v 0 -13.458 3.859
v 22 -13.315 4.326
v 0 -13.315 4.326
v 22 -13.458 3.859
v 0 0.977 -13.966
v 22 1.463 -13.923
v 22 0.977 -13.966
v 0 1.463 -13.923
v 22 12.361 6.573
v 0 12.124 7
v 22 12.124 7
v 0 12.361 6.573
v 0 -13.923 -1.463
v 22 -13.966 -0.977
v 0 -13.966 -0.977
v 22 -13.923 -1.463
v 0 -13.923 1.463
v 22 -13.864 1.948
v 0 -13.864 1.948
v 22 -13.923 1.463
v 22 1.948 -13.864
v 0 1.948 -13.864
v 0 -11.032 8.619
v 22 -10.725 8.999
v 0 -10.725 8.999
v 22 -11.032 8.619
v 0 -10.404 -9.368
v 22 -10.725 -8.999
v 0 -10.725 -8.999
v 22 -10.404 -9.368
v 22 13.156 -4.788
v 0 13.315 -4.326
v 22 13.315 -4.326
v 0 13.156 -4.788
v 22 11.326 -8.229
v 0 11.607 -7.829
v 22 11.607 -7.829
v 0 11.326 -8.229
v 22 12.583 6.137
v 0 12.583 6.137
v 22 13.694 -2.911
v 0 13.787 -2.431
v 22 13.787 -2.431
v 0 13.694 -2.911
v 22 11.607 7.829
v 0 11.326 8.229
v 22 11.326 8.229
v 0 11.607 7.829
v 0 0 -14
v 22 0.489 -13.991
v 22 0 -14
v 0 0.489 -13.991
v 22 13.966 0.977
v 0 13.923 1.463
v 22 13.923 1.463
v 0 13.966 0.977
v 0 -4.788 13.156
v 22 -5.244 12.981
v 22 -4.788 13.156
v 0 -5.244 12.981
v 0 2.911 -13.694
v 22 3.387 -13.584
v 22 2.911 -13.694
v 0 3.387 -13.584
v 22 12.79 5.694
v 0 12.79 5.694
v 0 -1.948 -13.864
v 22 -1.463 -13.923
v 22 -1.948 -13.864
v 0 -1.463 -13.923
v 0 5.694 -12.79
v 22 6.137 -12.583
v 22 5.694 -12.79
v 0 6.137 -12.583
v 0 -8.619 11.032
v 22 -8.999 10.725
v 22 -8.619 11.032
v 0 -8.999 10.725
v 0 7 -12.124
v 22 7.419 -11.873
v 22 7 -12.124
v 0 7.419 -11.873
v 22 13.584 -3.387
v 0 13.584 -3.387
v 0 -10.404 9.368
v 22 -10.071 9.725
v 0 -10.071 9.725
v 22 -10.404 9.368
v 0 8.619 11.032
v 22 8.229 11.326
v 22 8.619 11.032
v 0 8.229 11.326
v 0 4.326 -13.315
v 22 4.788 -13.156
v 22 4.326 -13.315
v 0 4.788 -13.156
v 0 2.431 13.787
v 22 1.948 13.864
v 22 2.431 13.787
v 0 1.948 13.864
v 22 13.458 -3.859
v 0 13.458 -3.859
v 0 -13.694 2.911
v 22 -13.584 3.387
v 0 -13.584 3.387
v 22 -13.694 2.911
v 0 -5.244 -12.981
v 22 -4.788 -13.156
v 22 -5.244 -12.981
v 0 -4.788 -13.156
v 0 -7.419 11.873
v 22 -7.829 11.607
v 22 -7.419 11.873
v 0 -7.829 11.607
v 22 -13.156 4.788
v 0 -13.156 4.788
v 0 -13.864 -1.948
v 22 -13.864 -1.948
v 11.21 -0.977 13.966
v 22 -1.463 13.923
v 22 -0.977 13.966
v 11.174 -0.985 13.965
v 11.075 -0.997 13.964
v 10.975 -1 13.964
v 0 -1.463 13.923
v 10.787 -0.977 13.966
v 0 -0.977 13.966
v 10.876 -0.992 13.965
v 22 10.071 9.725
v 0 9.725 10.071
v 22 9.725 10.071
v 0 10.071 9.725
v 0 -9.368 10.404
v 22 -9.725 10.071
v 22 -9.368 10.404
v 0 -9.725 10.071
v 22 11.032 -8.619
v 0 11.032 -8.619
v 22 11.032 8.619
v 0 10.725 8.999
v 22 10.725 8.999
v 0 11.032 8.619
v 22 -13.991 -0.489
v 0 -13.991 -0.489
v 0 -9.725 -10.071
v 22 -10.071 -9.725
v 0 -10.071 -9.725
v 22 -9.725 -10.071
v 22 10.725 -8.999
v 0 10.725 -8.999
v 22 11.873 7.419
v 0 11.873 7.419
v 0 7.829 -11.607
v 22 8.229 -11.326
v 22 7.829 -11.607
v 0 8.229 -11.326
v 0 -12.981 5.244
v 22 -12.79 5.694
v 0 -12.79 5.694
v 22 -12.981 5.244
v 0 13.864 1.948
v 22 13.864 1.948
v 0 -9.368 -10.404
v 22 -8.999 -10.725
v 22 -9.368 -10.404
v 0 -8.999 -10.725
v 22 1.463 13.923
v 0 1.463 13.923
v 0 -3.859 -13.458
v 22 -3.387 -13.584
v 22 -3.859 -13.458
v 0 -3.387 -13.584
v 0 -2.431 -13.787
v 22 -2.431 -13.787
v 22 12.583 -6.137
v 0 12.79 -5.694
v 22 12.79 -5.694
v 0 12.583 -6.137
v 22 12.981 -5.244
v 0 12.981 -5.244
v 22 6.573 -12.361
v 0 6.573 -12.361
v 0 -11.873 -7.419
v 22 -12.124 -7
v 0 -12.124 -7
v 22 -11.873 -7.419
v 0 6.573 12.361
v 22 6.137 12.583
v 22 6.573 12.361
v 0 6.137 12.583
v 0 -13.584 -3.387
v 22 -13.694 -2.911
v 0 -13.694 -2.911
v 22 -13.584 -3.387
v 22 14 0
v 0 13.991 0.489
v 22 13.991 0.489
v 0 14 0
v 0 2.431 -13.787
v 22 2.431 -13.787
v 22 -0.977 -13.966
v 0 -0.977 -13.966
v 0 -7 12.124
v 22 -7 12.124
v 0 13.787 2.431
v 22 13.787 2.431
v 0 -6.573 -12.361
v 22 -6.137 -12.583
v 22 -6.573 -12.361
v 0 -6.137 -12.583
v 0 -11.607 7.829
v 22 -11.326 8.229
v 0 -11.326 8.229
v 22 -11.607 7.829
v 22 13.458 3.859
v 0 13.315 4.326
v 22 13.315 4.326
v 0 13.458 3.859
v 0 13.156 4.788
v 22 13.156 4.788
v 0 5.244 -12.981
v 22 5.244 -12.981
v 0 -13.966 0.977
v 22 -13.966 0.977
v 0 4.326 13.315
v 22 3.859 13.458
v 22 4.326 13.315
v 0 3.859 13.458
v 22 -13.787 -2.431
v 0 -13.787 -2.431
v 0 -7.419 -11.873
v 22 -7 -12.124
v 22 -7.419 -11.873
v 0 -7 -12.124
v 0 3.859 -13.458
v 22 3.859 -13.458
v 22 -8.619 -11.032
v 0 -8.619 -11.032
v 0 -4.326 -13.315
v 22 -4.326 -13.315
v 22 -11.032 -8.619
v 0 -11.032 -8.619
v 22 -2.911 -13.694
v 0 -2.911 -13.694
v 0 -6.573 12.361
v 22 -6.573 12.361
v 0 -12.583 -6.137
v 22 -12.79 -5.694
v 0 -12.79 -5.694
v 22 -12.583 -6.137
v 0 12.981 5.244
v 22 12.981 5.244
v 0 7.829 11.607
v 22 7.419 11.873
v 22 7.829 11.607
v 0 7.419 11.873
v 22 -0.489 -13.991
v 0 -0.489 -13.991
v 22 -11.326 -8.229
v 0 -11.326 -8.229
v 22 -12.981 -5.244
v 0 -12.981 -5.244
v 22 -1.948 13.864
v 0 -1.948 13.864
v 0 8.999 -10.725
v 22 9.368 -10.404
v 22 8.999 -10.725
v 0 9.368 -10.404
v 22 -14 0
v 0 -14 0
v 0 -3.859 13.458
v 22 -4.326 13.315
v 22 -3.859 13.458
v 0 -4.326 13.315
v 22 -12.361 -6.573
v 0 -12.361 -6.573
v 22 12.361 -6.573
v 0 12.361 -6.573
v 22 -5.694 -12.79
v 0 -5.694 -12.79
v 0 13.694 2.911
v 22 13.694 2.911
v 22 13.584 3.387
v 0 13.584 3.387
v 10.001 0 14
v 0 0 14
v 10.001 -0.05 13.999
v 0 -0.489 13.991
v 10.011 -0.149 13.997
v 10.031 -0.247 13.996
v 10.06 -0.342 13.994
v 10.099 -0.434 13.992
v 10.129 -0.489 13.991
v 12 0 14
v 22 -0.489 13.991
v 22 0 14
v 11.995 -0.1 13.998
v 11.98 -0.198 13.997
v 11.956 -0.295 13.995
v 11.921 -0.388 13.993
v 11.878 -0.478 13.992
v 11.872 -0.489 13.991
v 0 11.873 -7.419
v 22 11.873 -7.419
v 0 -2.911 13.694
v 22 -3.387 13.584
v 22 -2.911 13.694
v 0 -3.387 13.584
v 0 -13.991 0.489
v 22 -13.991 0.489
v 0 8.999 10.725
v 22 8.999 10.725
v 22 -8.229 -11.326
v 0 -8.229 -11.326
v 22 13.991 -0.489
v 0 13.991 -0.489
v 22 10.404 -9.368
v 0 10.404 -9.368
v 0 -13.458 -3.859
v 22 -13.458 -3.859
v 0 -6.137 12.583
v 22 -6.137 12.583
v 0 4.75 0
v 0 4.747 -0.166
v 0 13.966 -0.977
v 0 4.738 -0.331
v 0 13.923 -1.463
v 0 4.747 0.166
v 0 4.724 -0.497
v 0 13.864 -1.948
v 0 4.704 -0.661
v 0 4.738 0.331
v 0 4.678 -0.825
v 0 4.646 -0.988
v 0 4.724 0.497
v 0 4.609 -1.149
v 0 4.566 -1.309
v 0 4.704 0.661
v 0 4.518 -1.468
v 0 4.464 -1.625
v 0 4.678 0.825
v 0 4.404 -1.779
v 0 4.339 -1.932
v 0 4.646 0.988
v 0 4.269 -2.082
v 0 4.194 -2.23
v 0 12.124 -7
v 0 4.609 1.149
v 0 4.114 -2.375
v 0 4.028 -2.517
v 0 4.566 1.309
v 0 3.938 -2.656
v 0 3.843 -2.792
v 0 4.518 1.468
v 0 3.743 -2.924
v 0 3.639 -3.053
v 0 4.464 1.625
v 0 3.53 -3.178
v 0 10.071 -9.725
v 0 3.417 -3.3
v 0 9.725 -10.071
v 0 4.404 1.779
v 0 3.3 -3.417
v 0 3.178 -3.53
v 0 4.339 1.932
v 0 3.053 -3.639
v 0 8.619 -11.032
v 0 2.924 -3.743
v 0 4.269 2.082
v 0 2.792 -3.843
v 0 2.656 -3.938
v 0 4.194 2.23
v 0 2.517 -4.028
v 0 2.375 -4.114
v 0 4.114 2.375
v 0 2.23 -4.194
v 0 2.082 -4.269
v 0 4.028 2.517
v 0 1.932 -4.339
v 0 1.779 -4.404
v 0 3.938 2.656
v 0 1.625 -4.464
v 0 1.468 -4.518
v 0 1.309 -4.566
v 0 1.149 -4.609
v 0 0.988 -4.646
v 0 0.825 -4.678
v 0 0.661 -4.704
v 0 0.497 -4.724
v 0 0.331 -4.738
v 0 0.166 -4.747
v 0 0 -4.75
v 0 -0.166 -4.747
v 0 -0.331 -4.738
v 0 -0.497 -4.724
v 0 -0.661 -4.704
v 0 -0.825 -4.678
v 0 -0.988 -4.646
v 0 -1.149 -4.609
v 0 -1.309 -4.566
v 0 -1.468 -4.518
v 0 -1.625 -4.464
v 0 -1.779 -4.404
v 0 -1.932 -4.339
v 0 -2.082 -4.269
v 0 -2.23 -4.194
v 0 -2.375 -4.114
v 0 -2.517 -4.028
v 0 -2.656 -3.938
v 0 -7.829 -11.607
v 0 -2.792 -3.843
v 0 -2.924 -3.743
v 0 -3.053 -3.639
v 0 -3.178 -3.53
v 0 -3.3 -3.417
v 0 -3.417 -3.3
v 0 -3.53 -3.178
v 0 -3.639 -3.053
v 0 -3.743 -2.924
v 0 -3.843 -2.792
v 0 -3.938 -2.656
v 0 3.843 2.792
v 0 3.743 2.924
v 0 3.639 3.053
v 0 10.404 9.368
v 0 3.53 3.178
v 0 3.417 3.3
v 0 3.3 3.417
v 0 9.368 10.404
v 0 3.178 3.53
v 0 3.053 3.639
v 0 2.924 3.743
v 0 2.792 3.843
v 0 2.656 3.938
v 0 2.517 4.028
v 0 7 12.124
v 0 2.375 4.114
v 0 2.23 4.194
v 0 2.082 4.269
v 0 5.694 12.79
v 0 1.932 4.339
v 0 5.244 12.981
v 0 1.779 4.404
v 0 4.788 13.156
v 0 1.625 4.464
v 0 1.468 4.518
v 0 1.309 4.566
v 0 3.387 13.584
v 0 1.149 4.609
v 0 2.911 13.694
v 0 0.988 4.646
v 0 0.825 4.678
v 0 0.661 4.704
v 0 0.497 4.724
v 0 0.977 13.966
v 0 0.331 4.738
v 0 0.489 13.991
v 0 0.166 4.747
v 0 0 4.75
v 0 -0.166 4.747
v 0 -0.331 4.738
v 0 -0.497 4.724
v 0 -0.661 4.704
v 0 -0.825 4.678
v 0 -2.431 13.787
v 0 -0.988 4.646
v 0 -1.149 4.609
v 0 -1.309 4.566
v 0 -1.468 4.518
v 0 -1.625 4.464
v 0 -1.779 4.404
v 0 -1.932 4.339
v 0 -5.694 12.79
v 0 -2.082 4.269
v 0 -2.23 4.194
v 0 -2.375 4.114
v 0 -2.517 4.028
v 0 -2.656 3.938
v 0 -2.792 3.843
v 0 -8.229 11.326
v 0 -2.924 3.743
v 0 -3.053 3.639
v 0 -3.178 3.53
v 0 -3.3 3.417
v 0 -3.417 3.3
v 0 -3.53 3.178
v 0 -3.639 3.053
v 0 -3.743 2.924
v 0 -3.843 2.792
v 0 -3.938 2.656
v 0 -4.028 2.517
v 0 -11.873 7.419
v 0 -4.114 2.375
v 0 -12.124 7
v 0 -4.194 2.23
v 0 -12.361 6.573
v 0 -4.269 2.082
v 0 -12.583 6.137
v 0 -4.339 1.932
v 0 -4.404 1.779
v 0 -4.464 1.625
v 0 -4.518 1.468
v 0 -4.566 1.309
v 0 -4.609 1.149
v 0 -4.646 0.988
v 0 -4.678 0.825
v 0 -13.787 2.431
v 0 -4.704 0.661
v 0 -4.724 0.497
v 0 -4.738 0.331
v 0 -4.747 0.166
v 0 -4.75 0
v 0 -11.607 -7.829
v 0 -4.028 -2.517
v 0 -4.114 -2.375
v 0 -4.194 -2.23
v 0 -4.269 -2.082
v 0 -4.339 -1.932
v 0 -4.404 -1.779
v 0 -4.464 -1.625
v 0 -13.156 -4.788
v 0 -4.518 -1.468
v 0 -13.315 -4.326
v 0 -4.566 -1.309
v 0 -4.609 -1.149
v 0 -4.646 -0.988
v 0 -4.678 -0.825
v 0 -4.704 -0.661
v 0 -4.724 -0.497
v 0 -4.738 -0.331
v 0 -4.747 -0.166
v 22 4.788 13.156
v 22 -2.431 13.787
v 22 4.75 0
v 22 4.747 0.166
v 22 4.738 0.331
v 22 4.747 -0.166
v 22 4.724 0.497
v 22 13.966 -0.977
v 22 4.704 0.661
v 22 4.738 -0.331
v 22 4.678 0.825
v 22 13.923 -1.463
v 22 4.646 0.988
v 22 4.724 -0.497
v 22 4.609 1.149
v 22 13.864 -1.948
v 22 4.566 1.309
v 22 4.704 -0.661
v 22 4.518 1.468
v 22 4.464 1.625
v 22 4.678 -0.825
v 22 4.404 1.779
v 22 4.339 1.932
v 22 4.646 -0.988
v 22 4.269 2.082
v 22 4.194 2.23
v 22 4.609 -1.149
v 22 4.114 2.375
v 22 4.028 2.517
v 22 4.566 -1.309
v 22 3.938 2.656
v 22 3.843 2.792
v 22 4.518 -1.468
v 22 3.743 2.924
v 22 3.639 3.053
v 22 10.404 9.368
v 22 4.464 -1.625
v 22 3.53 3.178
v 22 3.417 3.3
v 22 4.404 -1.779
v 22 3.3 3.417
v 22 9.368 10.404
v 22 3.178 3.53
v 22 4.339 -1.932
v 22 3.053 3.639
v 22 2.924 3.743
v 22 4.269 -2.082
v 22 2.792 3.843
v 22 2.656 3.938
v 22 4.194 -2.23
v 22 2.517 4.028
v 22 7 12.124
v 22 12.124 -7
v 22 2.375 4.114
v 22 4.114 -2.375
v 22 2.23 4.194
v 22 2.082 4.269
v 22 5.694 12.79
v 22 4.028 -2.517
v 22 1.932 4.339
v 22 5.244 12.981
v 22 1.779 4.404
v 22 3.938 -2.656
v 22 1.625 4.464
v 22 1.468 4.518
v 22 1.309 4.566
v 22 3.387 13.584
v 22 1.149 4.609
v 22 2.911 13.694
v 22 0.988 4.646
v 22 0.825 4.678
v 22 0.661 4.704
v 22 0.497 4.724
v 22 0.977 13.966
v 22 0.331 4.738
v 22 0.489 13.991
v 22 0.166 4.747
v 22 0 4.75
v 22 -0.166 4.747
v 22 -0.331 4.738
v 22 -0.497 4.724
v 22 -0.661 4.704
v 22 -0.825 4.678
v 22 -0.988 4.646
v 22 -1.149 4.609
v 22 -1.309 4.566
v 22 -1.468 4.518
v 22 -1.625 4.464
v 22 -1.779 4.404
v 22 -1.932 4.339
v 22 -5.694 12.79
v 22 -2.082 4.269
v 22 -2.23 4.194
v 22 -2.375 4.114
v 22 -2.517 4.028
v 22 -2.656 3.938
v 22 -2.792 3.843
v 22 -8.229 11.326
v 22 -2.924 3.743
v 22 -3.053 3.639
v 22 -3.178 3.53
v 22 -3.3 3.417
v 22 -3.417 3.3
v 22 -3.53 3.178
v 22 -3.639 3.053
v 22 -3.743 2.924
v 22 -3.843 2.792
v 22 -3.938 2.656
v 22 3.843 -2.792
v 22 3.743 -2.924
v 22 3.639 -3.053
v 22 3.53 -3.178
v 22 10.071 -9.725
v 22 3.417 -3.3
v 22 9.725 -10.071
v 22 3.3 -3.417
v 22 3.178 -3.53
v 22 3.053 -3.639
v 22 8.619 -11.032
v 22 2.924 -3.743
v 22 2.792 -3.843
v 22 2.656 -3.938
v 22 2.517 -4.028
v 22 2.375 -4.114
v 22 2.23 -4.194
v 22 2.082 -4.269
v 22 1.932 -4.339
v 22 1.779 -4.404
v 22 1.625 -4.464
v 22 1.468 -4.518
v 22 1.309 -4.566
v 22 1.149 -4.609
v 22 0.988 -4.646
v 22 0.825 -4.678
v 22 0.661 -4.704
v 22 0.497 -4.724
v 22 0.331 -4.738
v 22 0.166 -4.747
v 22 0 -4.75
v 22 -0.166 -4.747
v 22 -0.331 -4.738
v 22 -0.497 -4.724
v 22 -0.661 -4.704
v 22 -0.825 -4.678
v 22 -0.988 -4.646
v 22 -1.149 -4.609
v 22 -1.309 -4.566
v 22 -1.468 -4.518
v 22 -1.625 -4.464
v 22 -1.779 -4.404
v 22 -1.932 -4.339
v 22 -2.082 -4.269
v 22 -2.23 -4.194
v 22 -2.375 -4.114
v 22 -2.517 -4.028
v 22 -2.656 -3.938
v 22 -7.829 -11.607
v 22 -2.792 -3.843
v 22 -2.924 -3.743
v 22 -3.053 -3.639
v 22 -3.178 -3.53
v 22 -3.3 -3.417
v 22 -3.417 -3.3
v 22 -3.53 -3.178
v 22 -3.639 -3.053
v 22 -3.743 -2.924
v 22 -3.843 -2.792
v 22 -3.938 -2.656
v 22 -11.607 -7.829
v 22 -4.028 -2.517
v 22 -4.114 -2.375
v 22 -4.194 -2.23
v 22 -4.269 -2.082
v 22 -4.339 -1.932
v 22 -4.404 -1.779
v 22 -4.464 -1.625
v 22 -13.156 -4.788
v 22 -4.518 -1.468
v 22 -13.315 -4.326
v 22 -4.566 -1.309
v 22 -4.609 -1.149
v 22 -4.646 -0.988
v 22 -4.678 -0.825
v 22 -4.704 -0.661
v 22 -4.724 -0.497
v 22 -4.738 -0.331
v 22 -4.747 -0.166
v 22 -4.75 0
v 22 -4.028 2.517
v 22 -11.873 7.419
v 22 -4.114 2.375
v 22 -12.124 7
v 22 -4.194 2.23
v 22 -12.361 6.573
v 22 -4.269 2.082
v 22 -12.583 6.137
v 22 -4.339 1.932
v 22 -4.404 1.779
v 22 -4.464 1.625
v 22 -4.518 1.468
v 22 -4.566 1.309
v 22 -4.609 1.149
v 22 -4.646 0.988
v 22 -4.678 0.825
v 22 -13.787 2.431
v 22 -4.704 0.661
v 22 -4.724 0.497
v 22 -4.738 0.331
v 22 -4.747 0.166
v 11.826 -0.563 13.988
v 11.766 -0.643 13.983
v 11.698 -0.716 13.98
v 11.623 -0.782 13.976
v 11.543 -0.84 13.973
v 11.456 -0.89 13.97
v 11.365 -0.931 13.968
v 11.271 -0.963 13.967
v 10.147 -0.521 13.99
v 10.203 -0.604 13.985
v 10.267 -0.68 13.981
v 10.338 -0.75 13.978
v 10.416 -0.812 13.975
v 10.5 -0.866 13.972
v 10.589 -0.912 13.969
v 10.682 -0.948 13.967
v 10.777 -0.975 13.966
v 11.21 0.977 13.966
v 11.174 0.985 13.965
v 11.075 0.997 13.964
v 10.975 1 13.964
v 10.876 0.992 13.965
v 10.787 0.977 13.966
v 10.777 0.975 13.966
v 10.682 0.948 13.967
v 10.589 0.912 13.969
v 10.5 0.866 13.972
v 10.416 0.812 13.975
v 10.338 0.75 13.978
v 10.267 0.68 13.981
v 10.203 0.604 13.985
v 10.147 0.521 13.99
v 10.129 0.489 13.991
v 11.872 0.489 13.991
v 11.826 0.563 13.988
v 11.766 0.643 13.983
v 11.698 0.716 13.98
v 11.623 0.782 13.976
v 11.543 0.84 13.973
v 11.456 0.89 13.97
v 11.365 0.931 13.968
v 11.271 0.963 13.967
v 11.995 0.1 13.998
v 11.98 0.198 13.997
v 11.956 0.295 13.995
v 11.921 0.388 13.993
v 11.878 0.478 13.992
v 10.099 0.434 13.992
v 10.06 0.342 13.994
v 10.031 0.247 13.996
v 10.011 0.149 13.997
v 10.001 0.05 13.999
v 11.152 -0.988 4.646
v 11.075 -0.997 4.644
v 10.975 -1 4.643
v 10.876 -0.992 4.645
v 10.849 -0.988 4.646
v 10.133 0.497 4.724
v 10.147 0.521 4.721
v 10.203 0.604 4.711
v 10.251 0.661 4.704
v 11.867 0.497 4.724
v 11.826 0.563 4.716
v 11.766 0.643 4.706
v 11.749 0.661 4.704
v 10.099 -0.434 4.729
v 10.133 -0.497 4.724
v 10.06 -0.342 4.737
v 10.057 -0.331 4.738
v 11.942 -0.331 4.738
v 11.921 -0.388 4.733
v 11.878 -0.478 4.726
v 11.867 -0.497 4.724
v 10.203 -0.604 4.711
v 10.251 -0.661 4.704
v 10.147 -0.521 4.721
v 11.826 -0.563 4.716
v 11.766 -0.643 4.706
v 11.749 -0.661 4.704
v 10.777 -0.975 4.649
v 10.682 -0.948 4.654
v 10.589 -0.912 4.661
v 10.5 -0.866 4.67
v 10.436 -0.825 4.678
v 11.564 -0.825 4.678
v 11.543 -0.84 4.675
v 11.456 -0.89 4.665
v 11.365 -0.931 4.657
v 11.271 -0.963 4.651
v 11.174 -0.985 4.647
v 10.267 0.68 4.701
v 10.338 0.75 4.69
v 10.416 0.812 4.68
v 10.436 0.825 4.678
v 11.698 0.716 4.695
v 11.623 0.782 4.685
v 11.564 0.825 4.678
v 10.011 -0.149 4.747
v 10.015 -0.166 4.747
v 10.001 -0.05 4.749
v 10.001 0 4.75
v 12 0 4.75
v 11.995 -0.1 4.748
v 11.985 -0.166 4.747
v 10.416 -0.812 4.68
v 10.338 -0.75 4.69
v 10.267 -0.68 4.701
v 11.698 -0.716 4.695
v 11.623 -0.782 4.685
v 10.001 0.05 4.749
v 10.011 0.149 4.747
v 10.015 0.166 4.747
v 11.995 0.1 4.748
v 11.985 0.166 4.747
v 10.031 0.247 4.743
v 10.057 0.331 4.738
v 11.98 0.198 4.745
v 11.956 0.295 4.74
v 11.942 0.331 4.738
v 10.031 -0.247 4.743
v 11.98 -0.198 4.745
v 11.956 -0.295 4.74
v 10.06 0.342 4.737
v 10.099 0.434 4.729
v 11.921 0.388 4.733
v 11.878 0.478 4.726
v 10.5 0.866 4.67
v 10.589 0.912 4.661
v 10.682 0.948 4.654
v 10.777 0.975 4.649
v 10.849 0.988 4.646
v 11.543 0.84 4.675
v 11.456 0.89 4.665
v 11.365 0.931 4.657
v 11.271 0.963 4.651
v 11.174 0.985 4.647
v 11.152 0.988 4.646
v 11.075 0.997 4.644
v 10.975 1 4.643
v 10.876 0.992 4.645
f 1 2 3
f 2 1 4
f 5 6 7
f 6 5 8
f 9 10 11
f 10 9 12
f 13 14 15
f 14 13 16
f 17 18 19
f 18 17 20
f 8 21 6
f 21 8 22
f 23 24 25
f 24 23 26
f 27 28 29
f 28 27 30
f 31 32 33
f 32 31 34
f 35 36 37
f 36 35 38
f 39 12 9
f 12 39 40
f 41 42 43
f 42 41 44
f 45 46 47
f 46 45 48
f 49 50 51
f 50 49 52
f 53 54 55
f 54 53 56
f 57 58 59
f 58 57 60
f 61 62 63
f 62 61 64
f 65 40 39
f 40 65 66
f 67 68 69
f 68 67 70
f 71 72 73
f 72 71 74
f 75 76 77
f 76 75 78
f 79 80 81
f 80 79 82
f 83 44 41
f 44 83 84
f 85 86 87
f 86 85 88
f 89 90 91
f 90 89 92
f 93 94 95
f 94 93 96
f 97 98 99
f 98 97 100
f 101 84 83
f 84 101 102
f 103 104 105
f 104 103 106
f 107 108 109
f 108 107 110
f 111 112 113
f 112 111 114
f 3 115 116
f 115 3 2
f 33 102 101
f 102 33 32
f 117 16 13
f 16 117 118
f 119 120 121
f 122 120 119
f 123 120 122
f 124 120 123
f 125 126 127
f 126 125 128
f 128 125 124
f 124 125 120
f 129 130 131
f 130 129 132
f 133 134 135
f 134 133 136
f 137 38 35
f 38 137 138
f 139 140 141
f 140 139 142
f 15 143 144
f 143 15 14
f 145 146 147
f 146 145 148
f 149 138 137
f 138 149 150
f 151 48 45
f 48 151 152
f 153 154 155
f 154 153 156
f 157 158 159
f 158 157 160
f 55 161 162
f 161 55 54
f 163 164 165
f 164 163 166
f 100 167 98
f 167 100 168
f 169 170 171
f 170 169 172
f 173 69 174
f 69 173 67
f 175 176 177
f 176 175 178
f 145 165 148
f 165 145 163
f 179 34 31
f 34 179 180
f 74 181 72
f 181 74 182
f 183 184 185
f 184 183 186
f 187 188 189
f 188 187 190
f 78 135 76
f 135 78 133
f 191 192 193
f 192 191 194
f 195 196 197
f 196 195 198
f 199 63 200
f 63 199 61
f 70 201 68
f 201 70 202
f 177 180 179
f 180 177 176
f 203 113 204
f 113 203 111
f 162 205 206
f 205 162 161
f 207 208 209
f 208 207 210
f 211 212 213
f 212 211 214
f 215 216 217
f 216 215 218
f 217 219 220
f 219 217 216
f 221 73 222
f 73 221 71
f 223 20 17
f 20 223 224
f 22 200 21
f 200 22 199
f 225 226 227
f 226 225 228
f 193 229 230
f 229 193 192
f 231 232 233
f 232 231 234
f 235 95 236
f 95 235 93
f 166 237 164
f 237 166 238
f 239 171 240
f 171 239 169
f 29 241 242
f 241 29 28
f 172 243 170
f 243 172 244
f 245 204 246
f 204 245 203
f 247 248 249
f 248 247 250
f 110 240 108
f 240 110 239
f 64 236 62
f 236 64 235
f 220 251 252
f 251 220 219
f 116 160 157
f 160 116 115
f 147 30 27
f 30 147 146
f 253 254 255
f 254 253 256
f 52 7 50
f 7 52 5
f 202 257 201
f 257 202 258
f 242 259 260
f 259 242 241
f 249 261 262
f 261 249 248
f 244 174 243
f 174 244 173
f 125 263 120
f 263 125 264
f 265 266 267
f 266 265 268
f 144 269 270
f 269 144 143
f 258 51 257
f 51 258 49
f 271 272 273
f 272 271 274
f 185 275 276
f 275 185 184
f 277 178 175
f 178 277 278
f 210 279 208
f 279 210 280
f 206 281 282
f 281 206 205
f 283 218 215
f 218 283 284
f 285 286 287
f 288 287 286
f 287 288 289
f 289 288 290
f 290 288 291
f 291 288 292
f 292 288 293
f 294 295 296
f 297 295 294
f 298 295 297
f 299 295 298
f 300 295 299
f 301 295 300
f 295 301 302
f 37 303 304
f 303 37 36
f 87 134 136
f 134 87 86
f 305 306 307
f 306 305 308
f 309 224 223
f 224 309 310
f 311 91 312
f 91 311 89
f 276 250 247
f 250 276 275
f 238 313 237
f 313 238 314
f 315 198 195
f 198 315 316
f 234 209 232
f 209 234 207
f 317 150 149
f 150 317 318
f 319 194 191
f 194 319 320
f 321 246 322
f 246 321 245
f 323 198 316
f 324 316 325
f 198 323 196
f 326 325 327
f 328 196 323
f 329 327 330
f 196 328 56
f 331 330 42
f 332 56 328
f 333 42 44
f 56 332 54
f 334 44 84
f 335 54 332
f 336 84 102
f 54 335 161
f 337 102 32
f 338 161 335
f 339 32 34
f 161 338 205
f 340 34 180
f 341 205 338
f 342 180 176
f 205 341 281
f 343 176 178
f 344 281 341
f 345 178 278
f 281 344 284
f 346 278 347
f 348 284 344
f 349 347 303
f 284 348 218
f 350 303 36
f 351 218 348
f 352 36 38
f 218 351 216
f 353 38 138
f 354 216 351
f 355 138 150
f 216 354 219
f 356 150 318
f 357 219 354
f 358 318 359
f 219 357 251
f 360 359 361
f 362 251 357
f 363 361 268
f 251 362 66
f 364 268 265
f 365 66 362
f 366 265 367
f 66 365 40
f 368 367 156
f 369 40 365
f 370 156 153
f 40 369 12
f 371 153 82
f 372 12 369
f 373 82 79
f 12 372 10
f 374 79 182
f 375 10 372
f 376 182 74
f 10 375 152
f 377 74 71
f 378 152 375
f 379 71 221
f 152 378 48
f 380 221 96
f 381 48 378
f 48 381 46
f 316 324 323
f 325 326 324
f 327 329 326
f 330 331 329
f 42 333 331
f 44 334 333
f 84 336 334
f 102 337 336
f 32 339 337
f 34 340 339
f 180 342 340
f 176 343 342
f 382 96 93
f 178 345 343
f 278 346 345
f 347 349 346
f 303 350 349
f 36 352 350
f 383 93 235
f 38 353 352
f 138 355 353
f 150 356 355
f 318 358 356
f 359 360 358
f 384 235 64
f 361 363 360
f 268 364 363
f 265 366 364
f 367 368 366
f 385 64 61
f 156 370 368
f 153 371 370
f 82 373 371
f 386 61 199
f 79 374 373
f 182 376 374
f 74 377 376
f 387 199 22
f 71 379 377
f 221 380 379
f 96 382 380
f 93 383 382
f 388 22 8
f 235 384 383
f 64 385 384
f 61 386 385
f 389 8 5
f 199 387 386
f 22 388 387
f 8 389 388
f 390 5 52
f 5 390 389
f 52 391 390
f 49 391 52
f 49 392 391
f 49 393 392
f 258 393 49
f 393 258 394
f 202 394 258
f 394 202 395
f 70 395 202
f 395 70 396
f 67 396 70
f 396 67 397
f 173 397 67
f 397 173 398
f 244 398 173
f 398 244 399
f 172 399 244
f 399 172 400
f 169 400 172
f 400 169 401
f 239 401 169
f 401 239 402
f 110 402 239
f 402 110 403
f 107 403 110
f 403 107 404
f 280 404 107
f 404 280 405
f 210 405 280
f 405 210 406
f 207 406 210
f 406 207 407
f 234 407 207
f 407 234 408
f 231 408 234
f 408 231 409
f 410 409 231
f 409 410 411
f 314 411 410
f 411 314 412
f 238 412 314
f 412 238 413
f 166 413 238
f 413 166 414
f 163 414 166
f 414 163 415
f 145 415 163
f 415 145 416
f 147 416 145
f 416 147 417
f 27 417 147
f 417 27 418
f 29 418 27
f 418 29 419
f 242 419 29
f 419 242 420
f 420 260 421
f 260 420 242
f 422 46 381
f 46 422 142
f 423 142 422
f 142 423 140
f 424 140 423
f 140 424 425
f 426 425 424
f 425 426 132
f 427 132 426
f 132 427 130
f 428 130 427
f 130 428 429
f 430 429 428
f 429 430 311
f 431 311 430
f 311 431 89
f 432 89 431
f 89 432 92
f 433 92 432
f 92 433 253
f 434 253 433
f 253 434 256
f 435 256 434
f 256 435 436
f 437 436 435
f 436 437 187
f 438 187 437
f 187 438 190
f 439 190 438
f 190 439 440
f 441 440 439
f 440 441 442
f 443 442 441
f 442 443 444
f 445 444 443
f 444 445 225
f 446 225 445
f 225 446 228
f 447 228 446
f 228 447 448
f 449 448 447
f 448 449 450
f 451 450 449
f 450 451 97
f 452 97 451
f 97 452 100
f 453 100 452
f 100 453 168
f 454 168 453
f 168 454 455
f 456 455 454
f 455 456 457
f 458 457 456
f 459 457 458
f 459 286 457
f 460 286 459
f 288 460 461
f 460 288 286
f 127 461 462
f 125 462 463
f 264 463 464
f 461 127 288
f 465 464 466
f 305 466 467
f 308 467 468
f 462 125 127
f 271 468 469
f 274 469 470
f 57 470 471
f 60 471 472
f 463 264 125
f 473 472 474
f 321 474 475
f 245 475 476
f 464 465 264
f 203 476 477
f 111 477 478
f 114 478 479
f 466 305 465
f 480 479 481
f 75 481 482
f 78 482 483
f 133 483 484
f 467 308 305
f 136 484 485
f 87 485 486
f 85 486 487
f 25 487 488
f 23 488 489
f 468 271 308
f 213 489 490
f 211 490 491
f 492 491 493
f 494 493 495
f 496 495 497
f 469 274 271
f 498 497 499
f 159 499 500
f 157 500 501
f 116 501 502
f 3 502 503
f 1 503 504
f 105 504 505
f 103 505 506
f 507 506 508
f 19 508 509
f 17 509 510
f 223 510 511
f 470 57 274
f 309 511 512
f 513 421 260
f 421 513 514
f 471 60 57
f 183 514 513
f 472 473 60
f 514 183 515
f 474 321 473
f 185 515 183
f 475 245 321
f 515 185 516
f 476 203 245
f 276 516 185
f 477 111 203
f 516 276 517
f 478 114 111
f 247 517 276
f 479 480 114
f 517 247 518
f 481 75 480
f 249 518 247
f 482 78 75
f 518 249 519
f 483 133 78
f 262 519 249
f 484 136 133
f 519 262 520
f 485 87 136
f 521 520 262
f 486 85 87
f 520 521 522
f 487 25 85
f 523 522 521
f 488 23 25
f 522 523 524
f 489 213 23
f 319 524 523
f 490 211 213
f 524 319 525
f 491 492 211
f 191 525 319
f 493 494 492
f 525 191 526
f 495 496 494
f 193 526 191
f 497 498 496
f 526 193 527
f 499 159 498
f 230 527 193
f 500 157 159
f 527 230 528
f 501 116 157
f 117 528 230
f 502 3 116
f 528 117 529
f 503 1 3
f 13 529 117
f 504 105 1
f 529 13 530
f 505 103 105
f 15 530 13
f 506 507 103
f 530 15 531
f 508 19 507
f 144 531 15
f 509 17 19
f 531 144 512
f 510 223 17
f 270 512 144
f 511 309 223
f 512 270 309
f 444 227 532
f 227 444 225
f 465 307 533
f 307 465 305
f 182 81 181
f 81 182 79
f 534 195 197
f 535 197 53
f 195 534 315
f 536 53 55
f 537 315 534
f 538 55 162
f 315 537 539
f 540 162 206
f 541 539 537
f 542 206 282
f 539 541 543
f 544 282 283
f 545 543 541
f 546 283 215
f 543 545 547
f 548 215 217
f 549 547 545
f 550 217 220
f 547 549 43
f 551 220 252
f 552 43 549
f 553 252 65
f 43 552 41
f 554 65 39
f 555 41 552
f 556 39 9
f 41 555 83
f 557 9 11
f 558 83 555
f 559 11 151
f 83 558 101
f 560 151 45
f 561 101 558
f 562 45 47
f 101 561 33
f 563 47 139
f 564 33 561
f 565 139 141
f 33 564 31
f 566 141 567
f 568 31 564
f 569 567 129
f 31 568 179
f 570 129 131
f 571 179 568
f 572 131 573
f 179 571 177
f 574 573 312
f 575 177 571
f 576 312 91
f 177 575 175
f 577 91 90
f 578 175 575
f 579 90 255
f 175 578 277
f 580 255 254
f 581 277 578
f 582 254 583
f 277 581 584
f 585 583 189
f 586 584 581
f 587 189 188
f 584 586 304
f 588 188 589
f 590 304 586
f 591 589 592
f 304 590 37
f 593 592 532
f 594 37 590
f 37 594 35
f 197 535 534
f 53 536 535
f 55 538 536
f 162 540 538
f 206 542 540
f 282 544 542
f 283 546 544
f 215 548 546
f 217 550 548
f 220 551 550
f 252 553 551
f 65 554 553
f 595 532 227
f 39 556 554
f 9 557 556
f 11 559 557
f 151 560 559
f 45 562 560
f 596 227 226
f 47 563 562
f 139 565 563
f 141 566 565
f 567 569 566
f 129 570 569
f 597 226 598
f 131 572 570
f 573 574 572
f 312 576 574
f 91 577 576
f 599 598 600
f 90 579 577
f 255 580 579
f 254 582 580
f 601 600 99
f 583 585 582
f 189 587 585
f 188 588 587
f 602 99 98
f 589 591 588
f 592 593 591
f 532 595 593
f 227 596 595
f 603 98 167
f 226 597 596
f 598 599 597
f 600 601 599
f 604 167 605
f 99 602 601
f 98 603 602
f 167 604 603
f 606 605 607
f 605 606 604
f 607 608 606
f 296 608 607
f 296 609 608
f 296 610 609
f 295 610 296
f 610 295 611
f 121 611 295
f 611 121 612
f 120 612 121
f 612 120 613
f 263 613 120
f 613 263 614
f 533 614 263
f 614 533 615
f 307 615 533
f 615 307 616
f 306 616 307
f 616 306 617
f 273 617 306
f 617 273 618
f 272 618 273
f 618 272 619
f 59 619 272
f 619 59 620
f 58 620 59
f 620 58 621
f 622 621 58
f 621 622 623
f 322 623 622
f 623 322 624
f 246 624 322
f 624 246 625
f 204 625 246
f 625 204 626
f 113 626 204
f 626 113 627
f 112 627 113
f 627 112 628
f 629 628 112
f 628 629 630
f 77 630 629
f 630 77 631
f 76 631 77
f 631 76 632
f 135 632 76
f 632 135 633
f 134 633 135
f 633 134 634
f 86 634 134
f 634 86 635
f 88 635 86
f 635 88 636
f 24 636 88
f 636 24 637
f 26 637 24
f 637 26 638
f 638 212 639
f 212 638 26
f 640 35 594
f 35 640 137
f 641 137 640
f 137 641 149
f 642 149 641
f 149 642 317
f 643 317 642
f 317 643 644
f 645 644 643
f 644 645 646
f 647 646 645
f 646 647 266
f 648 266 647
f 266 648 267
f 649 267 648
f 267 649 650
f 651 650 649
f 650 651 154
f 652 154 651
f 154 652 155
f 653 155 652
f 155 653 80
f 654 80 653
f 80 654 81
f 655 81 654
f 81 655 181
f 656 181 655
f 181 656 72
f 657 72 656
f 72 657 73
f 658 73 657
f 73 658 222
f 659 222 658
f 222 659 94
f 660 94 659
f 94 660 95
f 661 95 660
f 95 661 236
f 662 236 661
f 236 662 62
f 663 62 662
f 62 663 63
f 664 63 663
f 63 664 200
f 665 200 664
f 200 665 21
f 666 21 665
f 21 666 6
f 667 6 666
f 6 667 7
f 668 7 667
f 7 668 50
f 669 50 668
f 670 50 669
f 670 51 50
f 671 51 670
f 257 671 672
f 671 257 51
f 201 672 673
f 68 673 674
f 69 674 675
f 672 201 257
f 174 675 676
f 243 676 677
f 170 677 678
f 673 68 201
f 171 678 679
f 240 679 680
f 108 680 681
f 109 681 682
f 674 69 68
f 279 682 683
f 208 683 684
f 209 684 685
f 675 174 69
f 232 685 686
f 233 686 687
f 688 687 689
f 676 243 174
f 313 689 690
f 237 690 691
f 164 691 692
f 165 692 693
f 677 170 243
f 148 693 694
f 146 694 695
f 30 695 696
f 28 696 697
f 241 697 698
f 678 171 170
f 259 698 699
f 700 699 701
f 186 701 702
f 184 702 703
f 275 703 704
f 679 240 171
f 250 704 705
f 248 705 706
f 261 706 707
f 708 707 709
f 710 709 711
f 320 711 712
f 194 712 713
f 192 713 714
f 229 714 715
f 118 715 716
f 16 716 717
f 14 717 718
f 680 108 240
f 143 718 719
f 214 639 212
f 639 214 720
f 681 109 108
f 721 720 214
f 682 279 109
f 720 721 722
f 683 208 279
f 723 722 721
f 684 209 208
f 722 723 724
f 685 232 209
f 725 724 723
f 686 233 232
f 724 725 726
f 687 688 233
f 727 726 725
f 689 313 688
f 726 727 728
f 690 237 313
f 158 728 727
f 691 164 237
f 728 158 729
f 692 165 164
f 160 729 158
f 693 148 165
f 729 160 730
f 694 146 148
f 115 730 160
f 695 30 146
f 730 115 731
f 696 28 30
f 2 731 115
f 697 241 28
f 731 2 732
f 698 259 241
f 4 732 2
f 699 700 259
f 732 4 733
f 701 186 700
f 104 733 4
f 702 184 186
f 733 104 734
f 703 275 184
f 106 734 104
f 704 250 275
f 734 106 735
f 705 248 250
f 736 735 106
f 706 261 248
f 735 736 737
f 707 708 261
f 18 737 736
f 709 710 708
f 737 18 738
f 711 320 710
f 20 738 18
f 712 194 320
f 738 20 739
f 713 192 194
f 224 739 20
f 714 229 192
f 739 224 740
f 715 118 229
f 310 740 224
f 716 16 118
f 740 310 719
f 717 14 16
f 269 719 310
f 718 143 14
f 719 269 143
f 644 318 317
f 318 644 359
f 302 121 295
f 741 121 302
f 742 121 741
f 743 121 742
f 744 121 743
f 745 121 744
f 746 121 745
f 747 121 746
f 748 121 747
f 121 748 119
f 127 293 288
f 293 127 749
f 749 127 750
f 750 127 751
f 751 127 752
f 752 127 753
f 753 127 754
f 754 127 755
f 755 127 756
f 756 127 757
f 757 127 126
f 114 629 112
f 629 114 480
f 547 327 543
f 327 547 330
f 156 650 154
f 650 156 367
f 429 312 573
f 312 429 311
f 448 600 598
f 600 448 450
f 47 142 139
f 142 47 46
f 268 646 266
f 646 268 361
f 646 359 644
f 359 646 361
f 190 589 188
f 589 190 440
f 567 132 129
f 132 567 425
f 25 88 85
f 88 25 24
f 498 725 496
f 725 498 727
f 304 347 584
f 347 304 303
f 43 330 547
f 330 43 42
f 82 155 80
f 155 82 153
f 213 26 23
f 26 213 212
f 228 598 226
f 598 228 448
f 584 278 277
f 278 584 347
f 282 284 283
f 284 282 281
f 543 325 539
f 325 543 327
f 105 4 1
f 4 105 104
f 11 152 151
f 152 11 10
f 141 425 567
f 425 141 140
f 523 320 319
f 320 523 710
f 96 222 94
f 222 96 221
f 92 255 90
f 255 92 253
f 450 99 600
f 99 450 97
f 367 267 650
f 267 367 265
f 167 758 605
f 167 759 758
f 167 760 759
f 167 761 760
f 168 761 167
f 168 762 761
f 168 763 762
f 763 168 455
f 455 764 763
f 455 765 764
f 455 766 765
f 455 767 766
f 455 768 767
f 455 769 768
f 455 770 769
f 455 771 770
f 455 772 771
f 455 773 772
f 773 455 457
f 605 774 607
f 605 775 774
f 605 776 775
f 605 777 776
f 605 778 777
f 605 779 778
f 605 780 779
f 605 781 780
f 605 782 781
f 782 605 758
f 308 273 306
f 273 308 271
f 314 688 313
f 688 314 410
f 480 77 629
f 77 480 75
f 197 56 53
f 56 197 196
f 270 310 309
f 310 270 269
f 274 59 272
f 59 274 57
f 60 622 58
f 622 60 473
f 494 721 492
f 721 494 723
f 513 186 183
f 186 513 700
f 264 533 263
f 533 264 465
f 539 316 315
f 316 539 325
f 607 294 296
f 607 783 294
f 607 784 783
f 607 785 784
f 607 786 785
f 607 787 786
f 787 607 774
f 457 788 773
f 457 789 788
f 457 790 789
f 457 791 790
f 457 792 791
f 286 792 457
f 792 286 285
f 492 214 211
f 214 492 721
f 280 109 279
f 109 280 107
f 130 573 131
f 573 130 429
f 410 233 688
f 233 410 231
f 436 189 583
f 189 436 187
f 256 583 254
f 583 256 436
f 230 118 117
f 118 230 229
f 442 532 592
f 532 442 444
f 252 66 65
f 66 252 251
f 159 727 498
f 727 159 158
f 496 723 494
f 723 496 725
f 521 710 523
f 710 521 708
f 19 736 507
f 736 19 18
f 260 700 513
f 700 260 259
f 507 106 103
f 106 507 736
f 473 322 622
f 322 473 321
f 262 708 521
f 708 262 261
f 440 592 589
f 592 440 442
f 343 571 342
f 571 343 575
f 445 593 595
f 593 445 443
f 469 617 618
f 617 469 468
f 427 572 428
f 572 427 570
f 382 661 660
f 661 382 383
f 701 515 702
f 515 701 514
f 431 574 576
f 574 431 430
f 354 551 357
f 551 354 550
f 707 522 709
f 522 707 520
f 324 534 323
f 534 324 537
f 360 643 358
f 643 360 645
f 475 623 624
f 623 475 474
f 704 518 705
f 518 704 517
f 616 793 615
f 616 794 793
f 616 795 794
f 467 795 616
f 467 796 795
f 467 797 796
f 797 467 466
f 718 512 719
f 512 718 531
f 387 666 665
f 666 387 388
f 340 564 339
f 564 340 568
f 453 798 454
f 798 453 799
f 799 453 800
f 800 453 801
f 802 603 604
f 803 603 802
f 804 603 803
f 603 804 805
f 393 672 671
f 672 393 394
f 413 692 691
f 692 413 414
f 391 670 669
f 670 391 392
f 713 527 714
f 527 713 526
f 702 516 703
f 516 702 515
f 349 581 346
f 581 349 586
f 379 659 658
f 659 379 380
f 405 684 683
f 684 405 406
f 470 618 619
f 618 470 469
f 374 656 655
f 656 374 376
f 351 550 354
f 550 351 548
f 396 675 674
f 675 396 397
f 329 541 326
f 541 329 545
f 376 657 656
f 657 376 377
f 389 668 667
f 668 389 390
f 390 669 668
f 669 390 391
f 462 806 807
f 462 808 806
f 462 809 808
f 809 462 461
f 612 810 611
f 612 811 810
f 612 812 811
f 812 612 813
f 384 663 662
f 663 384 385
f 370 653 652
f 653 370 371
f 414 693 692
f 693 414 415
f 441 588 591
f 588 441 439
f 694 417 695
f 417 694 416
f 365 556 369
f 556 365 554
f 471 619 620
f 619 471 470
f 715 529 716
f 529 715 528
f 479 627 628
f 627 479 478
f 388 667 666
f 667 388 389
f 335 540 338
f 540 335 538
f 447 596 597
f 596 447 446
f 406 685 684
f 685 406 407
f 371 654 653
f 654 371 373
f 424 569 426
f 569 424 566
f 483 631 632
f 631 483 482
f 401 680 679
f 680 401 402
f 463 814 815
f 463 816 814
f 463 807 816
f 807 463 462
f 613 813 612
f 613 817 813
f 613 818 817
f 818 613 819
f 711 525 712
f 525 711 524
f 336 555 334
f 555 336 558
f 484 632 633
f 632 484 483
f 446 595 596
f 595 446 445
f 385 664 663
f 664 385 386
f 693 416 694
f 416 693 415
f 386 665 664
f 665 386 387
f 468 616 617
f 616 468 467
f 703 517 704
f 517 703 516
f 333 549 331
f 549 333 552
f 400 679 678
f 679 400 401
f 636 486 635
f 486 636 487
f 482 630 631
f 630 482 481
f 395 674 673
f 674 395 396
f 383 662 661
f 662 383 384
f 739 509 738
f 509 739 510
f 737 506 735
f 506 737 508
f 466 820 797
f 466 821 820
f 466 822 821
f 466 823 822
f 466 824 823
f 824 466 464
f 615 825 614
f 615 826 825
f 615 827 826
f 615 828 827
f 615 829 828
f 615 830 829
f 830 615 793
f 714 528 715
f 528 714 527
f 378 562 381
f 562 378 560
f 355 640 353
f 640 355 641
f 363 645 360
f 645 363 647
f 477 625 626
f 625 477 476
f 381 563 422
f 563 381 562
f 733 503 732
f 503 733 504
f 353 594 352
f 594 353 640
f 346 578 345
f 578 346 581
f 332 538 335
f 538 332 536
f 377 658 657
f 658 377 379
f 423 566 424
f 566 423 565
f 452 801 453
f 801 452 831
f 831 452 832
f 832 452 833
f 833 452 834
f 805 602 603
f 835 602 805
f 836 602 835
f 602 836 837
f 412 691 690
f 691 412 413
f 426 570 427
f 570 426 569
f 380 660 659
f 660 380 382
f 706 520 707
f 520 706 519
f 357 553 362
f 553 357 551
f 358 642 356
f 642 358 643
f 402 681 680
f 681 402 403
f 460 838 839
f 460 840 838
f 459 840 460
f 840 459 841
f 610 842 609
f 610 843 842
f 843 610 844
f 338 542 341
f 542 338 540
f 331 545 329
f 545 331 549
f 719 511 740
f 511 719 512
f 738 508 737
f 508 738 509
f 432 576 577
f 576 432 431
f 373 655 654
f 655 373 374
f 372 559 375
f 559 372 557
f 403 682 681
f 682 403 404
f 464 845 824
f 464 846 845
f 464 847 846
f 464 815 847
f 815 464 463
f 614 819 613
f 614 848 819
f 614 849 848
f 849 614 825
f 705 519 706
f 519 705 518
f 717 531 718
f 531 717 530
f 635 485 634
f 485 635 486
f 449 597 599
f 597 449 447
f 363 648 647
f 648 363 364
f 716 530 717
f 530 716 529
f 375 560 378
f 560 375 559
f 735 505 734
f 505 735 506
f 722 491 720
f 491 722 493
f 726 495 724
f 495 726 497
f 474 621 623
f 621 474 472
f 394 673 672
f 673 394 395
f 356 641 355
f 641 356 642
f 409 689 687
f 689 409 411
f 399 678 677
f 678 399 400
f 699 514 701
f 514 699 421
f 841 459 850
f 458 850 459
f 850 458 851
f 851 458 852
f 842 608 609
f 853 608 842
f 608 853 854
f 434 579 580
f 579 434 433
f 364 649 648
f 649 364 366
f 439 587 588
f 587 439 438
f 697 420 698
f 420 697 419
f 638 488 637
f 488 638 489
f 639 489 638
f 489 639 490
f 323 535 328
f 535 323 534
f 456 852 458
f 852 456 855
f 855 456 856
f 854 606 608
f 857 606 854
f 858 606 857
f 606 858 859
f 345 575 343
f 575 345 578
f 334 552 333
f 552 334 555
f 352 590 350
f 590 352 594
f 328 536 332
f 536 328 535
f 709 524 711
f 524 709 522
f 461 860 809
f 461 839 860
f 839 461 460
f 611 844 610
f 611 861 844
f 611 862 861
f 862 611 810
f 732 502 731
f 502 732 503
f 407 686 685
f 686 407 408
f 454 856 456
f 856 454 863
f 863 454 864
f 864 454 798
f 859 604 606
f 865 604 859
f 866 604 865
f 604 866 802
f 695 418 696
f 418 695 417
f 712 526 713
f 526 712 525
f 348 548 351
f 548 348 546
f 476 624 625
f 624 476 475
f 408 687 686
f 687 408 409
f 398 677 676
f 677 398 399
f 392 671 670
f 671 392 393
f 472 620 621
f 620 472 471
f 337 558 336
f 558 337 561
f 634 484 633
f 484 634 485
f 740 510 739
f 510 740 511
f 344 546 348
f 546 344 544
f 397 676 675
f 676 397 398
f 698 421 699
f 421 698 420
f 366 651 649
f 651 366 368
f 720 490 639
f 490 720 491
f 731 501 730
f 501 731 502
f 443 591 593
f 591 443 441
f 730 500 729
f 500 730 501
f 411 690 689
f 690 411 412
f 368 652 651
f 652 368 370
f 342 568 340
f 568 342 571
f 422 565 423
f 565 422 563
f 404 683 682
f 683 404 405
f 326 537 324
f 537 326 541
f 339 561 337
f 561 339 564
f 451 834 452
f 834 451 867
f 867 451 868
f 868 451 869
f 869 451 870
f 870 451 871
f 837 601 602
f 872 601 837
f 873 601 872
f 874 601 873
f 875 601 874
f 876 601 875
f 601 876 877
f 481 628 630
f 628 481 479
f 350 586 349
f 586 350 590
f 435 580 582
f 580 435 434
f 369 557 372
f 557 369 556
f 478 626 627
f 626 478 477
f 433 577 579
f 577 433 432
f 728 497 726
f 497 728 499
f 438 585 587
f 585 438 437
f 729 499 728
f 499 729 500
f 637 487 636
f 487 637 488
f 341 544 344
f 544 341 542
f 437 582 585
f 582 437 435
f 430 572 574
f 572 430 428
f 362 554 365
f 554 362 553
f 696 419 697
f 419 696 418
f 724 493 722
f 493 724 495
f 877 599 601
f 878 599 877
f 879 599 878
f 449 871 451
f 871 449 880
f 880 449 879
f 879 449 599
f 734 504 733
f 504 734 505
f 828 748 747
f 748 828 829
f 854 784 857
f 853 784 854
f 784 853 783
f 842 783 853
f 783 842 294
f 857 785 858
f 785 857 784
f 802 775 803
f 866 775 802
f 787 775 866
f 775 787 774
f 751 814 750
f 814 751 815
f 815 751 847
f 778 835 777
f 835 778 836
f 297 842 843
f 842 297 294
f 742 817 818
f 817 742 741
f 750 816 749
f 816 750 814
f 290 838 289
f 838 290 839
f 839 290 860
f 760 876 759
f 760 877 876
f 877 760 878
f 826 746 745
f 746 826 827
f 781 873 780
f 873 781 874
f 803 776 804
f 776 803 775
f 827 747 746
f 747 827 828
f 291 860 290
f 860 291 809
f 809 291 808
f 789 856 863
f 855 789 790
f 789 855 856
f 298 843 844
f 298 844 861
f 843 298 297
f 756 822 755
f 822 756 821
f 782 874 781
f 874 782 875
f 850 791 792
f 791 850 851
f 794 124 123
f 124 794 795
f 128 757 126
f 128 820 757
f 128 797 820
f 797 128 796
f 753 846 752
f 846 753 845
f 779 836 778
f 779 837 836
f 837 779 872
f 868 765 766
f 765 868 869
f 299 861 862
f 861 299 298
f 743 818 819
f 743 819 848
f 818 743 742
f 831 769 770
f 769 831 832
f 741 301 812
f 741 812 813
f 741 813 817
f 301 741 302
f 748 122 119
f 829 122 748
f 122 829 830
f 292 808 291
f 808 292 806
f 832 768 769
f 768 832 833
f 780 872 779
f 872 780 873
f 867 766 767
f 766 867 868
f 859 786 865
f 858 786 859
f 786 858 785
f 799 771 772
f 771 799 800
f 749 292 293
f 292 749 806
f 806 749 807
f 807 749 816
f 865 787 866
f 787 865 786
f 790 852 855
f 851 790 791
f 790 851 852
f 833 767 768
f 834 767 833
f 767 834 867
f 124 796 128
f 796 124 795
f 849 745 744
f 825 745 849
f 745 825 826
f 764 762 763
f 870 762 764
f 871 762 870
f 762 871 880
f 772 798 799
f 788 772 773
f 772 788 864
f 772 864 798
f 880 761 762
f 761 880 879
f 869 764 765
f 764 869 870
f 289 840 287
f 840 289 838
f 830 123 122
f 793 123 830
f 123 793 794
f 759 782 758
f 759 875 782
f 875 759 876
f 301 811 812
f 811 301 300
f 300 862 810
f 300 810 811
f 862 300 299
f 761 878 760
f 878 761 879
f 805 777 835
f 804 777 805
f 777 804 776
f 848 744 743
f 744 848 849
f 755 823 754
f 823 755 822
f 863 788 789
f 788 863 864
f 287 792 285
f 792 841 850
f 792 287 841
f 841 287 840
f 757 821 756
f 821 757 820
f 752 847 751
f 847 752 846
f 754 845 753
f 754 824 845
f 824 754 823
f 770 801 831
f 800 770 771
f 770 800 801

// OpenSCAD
// file: ../lib/common.scad
// Shared helpers for the AR turntable part models.
//
// Every part file holds a parameter table P. Each row is:
//   [id, description, value_mm, evidence, display_unit, source_or_how_to_check]
//
// Evidence codes:
//   F  factory document          O  owner report
//   C  community drawing         S  industry standard
//   D  design choice             M  measured for this repository
//   PH placeholder: chosen only so the model has a shape. It is NOT a
//      measurement. Replace it, and change the code, once it is measured.
// License: CC BY-SA 4.0. See LICENSE at the repository root.

IN = 25.4;      // one inch, in mm. All model geometry is in mm.
EPS = 0.01;     // overlap so boolean cuts do not leave zero-thickness skins
$fa = 2;
$fs = 0.1;

// Value of parameter `id` in table t.
function pv(t, id) = t[search([id], t)[0]][2];

// Print part data for cad/tools/build.py, which reads it from the console.
module emit(meta, params, dims = []) {
    echo(META = meta);
    for (row = params) echo(PARAM = row);
    for (row = dims) echo(DIM = row);
}

// Rounded rectangle prism: centered in XY, from z = 0 to z = h.
module rr_prism(l, w, h, r) {
    translate([-l / 2 + r, -w / 2, 0]) cube([l - 2 * r, w, h]);
    translate([-l / 2, -w / 2 + r, 0]) cube([l, w - 2 * r, h]);
    for (sx = [-1, 1], sy = [-1, 1])
        translate([sx * (l / 2 - r), sy * (w / 2 - r), 0]) cylinder(r = r, h = h);
}

// Slot along X: `c` is the distance between end-radius centers.
module slot_prism(c, w, h) {
    translate([-c / 2, -w / 2, 0]) cube([c, w, h]);
    for (sx = [-1, 1]) translate([sx * c / 2, 0, 0]) cylinder(d = w, h = h);
}
// main file
// AR XA tonearm counterweight.
// Size, bore, material, and mass come from one owner's report on one XA:
// parts/xa-counterweight.md. Parameter IDs match TO-CONFIRM.md.
// License: CC BY-SA 4.0. See LICENSE at the repository root.
include <../lib/common.scad>

variant = 1;
flat = false;

P = [
    ["CW3", "Outside diameter", 28, "O", "mm", "Owner report, parts/xa-counterweight.md"],
    ["CW4", "Length along bore", 22, "O", "mm", "Owner report, parts/xa-counterweight.md"],
    ["CW5", "Bore diameter", 9.5, "O", "mm", "Owner report; a nominal value, not a fit against the arm stub"],
    ["CW6", "Bore runs through and on center: assumed", 22, "PH", "mm", "Inspect the part. Measure wall thickness around the bore"],
    ["CW8", "Locking-hole size, tap drill until thread is known", 2.0, "PH", "mm", "Gauge the set screw thread, then set the tap drill"],
    ["CW9", "Locking-hole position from the end face", 11, "PH", "mm", "Calipers, from one end of the weight"],
];

od = pv(P, "CW3");
len = pv(P, "CW4");
bore = pv(P, "CW5");
lock_d = pv(P, "CW8");
lock_x = pv(P, "CW9");

// Axis along X so the top view shows the weight as it sits on the arm.
module part() {
    difference() {
        rotate([0, 90, 0]) cylinder(d = od, h = len);
        translate([-1, 0, 0]) rotate([0, 90, 0]) cylinder(d = bore, h = len + 2);
        translate([lock_x, 0, 0]) cylinder(d = lock_d, h = od);
    }
}

emit(
    [
        ["id", "xa-counterweight"],
        ["title", "XA tonearm counterweight"],
        ["status", "PRELIMINARY"],
        ["scope", "One owner's XA. XB and AR77XB counterweights differ"],
        ["material", "Brass, alloy not established (owner report)"],
        ["density", 8.5],
        ["make", "Turn, bore, cross-drill and tap. 1 off"],
        ["reference_mass_g", 98.8],
        ["views", ["front", "top", "right", "left", "iso"]],
        ["sections", [["A", "y", 0]]],
        ["notes", [
            "Reported mass 98.8 g includes the set screw. Compare with the estimate in the title block.",
            "Bore fit, thread, and edge details are not established. A nominal 9.5 mm owner value is not a fit.",
            "Weigh the original with and without its screw before ordering: TO-CONFIRM.md, CW1 and CW2.",
        ]],
    ],
    P,
    [
        ["front", "h", [0, 0, 0], [len, 0, 0], -9, "CW4"],
        ["front", "v", [len, 0, -od / 2], [len, 0, od / 2], 10, "CW3", "Ø"],
        ["front", "h", [0, 0, od / 2], [lock_x, 0, od / 2], 9, "CW9"],
        ["front", "cl", [-4, 0, 0], [len + 4, 0, 0]],
        ["right", "d", [0, 0, 0], bore / 2, 9, "CW5", "Ø", 40],
        ["top", "d", [lock_x, 0, 0], lock_d / 2, 9, "CW8", "Ø", 60],
        ["A", "h", [0, 0, -bore / 2], [len, 0, -bore / 2], -9, "CW6", "THRU "],
    ]
);

if (flat) projection() part(); else part();
